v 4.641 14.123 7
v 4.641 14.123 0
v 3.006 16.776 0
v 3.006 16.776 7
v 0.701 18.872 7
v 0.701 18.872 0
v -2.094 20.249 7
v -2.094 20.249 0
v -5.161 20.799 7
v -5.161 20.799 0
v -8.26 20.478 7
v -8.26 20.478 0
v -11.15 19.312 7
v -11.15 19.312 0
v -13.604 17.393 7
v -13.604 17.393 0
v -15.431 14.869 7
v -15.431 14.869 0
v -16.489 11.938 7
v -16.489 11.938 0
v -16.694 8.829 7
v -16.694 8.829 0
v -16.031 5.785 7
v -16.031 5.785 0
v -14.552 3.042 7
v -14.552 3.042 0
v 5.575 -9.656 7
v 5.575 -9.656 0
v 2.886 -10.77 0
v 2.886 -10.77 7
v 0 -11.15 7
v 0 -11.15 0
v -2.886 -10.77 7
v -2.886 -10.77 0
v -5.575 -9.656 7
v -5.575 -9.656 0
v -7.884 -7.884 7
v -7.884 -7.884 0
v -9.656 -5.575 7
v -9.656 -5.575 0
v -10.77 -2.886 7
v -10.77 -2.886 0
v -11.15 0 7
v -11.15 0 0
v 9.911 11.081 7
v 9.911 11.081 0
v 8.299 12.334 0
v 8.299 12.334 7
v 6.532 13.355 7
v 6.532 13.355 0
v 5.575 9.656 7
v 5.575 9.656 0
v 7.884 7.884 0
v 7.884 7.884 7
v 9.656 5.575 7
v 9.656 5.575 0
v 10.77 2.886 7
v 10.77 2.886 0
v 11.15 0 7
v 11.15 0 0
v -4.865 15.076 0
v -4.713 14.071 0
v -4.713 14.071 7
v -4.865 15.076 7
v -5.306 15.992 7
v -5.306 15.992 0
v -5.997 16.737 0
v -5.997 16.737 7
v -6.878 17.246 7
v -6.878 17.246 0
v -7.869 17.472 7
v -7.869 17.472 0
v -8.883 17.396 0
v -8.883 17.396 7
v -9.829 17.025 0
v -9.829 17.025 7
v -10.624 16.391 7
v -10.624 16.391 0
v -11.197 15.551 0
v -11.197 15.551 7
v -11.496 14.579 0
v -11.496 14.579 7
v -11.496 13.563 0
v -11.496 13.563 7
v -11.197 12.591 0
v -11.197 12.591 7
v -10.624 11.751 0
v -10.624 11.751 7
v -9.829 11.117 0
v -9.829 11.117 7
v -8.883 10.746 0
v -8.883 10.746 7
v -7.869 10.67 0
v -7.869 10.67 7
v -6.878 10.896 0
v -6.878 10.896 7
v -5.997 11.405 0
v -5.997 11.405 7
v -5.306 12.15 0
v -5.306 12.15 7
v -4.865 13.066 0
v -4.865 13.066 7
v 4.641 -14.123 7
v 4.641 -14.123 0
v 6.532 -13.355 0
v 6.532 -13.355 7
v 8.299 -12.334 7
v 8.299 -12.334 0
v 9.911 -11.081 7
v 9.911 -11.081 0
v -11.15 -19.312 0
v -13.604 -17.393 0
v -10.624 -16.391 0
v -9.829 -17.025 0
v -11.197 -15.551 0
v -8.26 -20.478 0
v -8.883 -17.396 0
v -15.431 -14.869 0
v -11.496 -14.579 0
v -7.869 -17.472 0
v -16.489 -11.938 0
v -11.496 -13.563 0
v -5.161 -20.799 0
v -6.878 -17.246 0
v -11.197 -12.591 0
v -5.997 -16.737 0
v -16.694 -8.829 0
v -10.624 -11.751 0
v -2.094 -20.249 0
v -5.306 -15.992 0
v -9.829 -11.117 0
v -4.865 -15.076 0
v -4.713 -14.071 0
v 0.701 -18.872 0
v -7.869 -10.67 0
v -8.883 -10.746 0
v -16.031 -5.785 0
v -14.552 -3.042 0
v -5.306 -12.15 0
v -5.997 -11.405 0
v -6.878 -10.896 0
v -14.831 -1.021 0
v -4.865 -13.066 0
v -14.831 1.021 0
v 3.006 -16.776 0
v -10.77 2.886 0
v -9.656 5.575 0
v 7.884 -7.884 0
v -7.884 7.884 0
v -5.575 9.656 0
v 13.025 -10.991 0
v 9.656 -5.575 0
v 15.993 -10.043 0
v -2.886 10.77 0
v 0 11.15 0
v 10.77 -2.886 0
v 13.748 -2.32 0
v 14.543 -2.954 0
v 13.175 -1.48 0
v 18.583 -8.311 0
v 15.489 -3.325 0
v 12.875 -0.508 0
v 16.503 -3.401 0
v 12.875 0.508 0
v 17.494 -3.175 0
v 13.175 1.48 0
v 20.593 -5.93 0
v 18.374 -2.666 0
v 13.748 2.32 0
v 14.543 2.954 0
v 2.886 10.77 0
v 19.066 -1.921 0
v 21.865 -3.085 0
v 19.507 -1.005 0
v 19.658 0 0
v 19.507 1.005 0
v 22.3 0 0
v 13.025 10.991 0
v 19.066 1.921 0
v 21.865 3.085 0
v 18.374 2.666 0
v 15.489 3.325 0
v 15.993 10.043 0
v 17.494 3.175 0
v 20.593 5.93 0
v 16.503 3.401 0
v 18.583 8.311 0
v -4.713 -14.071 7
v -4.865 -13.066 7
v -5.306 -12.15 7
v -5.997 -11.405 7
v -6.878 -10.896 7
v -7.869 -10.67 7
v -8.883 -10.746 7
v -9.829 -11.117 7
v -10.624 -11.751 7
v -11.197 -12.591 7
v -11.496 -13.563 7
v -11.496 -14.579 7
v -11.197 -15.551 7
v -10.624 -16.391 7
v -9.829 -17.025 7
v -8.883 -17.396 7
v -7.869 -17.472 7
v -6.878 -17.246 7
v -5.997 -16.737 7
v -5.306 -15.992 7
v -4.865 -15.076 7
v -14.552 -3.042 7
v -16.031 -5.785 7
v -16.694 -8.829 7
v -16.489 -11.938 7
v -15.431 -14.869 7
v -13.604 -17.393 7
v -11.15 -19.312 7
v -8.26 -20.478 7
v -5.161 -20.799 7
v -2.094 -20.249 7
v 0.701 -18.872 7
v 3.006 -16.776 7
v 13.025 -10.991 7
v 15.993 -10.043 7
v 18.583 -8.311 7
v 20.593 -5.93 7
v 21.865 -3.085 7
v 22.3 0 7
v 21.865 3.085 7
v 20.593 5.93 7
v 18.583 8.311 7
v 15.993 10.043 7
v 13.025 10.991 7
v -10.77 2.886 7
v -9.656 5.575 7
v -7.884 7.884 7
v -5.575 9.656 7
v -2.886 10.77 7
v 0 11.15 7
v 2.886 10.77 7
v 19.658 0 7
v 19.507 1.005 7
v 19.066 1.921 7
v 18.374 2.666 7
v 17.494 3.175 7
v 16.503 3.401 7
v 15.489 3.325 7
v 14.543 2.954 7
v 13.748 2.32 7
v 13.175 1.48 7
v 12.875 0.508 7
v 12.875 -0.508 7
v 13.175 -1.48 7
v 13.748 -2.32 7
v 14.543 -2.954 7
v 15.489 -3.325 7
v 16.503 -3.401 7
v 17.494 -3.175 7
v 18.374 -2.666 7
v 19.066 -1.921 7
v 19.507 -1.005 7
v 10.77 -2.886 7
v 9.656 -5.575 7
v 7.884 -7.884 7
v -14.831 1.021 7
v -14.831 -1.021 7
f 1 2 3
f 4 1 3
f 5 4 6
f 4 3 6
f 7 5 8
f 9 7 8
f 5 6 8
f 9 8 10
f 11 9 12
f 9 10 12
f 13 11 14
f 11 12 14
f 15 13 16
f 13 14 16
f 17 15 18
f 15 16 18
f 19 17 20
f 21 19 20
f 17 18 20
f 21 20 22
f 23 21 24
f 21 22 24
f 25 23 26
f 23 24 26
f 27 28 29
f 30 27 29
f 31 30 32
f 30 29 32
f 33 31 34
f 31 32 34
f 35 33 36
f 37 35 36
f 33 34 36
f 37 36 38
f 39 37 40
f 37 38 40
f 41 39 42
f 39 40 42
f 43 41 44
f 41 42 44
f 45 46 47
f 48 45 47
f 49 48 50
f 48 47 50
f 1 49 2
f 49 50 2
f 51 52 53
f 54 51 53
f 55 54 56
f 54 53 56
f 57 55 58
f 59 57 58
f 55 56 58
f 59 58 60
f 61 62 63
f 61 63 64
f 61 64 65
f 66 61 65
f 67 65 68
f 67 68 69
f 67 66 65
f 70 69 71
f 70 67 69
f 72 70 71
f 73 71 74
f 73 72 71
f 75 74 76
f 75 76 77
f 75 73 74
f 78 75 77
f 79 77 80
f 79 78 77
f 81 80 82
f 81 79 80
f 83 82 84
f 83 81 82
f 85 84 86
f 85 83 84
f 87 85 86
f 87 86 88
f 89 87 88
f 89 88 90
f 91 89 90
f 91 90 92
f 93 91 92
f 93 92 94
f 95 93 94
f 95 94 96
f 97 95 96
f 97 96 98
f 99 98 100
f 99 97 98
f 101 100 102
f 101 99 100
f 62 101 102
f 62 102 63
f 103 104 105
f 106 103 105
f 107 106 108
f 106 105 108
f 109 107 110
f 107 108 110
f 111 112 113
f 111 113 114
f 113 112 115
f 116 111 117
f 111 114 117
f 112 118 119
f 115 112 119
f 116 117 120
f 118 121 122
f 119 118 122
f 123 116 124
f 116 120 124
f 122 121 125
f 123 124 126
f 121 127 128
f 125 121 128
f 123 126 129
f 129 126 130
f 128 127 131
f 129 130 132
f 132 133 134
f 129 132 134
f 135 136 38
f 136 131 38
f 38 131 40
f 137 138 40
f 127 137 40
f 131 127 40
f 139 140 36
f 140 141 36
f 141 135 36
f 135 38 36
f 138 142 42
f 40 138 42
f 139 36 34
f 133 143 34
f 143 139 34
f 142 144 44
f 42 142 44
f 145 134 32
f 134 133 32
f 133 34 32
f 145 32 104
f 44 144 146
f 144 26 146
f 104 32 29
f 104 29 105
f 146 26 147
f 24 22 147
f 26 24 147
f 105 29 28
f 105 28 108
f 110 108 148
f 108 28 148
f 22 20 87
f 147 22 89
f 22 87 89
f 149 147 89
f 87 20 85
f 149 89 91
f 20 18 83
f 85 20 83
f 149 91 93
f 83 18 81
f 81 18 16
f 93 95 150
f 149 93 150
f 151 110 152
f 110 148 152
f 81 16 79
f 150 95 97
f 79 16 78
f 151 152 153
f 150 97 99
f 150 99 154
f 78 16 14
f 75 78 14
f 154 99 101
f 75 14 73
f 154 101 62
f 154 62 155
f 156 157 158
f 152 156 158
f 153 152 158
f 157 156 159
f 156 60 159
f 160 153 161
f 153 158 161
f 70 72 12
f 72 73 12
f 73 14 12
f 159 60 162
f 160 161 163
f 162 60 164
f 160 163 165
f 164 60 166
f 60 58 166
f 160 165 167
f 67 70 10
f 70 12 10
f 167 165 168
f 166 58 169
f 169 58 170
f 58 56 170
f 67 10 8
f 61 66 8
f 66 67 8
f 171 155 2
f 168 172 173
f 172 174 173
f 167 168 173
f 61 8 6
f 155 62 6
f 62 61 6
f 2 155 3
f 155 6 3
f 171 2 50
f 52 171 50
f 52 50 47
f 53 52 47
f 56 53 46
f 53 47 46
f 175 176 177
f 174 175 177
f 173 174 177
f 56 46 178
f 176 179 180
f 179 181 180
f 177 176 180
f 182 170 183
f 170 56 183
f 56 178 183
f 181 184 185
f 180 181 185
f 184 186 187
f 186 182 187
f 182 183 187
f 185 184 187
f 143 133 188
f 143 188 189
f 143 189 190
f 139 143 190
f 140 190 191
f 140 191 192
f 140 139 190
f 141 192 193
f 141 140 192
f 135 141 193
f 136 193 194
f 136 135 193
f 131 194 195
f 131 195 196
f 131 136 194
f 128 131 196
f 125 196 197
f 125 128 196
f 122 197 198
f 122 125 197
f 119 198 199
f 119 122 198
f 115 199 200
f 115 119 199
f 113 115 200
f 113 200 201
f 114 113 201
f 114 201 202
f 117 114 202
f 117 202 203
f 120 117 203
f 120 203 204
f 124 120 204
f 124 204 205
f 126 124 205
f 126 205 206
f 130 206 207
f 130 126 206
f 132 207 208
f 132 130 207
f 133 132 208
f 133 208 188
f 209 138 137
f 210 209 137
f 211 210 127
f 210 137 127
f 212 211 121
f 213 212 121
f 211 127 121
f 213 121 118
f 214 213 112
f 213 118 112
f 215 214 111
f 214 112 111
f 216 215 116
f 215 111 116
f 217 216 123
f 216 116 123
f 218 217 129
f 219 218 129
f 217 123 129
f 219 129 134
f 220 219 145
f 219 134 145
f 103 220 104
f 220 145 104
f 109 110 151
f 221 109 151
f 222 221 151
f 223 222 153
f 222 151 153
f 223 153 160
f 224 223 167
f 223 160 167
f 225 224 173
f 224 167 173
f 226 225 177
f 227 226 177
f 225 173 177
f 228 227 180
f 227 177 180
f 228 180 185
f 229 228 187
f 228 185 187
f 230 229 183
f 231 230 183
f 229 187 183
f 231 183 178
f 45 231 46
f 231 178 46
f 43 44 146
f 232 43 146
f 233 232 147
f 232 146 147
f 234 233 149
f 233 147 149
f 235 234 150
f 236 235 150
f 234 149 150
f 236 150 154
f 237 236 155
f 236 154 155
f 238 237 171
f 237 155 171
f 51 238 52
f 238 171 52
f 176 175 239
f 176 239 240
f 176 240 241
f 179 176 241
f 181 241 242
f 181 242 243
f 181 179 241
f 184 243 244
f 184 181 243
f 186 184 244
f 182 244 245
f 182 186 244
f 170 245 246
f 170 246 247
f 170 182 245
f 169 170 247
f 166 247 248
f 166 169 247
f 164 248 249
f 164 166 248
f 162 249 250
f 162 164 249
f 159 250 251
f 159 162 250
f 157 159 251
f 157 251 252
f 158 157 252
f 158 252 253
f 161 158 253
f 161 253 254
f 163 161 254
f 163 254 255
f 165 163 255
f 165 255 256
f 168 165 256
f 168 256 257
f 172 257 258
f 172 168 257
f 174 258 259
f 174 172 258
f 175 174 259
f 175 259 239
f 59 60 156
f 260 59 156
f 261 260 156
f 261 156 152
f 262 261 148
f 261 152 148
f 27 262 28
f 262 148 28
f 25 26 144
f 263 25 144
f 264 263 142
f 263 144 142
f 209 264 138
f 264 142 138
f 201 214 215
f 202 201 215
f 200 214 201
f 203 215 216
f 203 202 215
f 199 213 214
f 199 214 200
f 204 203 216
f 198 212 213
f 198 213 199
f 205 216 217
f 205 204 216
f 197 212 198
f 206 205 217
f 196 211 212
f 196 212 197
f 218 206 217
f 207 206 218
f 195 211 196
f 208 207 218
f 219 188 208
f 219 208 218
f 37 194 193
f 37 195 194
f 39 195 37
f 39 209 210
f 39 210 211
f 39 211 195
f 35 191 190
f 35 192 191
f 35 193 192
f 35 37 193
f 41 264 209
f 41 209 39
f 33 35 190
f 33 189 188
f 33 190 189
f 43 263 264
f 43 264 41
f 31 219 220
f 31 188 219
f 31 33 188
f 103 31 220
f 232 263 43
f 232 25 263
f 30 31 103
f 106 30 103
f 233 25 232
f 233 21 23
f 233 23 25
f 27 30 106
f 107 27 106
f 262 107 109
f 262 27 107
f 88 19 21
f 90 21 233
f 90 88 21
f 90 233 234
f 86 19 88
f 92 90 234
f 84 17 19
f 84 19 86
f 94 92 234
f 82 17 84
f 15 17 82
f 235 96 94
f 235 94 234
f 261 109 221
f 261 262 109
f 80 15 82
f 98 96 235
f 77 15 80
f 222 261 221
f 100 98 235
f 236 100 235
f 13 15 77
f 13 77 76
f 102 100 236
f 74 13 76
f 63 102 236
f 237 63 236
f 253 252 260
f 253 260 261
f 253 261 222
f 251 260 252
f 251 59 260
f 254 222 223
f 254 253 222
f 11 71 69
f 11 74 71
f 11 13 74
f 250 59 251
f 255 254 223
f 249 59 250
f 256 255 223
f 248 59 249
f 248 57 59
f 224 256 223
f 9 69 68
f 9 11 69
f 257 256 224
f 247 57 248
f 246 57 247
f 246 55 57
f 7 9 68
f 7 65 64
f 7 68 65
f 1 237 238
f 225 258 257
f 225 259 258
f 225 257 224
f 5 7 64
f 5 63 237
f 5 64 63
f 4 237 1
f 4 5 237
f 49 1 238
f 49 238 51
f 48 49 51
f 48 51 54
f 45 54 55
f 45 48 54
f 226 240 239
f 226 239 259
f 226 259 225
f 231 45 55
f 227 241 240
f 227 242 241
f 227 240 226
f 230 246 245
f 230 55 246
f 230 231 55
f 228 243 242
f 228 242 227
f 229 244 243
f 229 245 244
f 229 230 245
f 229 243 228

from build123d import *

# Parameters (mm, degrees)
F0_R     = 3.410519
F1_DEPTH = 7


with BuildPart() as f1:
    # F0 (on Top) → F1 (new body)
    with BuildSketch(Plane.XY):
        with BuildLine():
            ThreePointArc((-11.15, 0), (-5.575, 9.656183), (5.575, 9.656183))
            ThreePointArc((5.575, 9.656183), (5.339004, 11.938072), (4.641006, 14.123366))
            ThreePointArc((4.641006, 14.123366), (-11.15, 19.312367), (-14.551697, 3.042454))
            ThreePointArc((-14.551697, 3.042454), (-13.008176, 1.345323), (-11.15, 0))
        make_face()
        with Locations((-8.123896, 14.071)):
            Circle(F0_R, mode=Mode.SUBTRACT)
        with BuildLine():
            ThreePointArc((-14.551697, -3.042454), (-13.008176, -1.345323), (-11.15, 0))
            ThreePointArc((-11.15, 0), (-13.008176, 1.345323), (-14.551697, 3.042454))
            ThreePointArc((-14.551697, 3.042454), (-14.866351, 0), (-14.551697, -3.042454))
        make_face()
        with BuildLine():
            ThreePointArc((4.641006, -14.123366), (5.339004, -11.938072), (5.575, -9.656183))
            ThreePointArc((5.575, -9.656183), (-5.575, -9.656183), (-11.15, 0))
            ThreePointArc((-11.15, 0), (-13.008176, -1.345323), (-14.551697, -3.042454))
            ThreePointArc((-14.551697, -3.042454), (-11.15, -19.312367), (4.641006, -14.123366))
        make_face()
        with Locations((-8.123896, -14.071)):
            Circle(F0_R, mode=Mode.SUBTRACT)
        with BuildLine():
            ThreePointArc((9.91069, -11.080912), (7.669172, -10.592749), (5.575, -9.656183))
            ThreePointArc((5.575, -9.656183), (5.339004, -11.938072), (4.641006, -14.123366))
            ThreePointArc((4.641006, -14.123366), (7.433176, -12.874638), (9.91069, -11.080912))
        make_face()
        with BuildLine():
            ThreePointArc((5.575, 9.656183), (9.656183, 5.575), (11.15, 0))
            ThreePointArc((11.15, 0), (9.656183, -5.575), (5.575, -9.656183))
            ThreePointArc((5.575, -9.656183), (7.669172, -10.592749), (9.91069, -11.080912))
            ThreePointArc((9.91069, -11.080912), (22.3, 0), (9.91069, 11.080912))
            ThreePointArc((9.91069, 11.080912), (7.669172, 10.592749), (5.575, 9.656183))
        make_face()
        with Locations((16.247792, 0)):
            Circle(F0_R, mode=Mode.SUBTRACT)
        with BuildLine():
            ThreePointArc((4.641006, 14.123366), (5.339004, 11.938072), (5.575, 9.656183))
            ThreePointArc((5.575, 9.656183), (7.669172, 10.592749), (9.91069, 11.080912))
            ThreePointArc((9.91069, 11.080912), (7.433176, 12.874638), (4.641006, 14.123366))
        make_face()
    extrude(amount=F1_DEPTH)


solid = f1.part
